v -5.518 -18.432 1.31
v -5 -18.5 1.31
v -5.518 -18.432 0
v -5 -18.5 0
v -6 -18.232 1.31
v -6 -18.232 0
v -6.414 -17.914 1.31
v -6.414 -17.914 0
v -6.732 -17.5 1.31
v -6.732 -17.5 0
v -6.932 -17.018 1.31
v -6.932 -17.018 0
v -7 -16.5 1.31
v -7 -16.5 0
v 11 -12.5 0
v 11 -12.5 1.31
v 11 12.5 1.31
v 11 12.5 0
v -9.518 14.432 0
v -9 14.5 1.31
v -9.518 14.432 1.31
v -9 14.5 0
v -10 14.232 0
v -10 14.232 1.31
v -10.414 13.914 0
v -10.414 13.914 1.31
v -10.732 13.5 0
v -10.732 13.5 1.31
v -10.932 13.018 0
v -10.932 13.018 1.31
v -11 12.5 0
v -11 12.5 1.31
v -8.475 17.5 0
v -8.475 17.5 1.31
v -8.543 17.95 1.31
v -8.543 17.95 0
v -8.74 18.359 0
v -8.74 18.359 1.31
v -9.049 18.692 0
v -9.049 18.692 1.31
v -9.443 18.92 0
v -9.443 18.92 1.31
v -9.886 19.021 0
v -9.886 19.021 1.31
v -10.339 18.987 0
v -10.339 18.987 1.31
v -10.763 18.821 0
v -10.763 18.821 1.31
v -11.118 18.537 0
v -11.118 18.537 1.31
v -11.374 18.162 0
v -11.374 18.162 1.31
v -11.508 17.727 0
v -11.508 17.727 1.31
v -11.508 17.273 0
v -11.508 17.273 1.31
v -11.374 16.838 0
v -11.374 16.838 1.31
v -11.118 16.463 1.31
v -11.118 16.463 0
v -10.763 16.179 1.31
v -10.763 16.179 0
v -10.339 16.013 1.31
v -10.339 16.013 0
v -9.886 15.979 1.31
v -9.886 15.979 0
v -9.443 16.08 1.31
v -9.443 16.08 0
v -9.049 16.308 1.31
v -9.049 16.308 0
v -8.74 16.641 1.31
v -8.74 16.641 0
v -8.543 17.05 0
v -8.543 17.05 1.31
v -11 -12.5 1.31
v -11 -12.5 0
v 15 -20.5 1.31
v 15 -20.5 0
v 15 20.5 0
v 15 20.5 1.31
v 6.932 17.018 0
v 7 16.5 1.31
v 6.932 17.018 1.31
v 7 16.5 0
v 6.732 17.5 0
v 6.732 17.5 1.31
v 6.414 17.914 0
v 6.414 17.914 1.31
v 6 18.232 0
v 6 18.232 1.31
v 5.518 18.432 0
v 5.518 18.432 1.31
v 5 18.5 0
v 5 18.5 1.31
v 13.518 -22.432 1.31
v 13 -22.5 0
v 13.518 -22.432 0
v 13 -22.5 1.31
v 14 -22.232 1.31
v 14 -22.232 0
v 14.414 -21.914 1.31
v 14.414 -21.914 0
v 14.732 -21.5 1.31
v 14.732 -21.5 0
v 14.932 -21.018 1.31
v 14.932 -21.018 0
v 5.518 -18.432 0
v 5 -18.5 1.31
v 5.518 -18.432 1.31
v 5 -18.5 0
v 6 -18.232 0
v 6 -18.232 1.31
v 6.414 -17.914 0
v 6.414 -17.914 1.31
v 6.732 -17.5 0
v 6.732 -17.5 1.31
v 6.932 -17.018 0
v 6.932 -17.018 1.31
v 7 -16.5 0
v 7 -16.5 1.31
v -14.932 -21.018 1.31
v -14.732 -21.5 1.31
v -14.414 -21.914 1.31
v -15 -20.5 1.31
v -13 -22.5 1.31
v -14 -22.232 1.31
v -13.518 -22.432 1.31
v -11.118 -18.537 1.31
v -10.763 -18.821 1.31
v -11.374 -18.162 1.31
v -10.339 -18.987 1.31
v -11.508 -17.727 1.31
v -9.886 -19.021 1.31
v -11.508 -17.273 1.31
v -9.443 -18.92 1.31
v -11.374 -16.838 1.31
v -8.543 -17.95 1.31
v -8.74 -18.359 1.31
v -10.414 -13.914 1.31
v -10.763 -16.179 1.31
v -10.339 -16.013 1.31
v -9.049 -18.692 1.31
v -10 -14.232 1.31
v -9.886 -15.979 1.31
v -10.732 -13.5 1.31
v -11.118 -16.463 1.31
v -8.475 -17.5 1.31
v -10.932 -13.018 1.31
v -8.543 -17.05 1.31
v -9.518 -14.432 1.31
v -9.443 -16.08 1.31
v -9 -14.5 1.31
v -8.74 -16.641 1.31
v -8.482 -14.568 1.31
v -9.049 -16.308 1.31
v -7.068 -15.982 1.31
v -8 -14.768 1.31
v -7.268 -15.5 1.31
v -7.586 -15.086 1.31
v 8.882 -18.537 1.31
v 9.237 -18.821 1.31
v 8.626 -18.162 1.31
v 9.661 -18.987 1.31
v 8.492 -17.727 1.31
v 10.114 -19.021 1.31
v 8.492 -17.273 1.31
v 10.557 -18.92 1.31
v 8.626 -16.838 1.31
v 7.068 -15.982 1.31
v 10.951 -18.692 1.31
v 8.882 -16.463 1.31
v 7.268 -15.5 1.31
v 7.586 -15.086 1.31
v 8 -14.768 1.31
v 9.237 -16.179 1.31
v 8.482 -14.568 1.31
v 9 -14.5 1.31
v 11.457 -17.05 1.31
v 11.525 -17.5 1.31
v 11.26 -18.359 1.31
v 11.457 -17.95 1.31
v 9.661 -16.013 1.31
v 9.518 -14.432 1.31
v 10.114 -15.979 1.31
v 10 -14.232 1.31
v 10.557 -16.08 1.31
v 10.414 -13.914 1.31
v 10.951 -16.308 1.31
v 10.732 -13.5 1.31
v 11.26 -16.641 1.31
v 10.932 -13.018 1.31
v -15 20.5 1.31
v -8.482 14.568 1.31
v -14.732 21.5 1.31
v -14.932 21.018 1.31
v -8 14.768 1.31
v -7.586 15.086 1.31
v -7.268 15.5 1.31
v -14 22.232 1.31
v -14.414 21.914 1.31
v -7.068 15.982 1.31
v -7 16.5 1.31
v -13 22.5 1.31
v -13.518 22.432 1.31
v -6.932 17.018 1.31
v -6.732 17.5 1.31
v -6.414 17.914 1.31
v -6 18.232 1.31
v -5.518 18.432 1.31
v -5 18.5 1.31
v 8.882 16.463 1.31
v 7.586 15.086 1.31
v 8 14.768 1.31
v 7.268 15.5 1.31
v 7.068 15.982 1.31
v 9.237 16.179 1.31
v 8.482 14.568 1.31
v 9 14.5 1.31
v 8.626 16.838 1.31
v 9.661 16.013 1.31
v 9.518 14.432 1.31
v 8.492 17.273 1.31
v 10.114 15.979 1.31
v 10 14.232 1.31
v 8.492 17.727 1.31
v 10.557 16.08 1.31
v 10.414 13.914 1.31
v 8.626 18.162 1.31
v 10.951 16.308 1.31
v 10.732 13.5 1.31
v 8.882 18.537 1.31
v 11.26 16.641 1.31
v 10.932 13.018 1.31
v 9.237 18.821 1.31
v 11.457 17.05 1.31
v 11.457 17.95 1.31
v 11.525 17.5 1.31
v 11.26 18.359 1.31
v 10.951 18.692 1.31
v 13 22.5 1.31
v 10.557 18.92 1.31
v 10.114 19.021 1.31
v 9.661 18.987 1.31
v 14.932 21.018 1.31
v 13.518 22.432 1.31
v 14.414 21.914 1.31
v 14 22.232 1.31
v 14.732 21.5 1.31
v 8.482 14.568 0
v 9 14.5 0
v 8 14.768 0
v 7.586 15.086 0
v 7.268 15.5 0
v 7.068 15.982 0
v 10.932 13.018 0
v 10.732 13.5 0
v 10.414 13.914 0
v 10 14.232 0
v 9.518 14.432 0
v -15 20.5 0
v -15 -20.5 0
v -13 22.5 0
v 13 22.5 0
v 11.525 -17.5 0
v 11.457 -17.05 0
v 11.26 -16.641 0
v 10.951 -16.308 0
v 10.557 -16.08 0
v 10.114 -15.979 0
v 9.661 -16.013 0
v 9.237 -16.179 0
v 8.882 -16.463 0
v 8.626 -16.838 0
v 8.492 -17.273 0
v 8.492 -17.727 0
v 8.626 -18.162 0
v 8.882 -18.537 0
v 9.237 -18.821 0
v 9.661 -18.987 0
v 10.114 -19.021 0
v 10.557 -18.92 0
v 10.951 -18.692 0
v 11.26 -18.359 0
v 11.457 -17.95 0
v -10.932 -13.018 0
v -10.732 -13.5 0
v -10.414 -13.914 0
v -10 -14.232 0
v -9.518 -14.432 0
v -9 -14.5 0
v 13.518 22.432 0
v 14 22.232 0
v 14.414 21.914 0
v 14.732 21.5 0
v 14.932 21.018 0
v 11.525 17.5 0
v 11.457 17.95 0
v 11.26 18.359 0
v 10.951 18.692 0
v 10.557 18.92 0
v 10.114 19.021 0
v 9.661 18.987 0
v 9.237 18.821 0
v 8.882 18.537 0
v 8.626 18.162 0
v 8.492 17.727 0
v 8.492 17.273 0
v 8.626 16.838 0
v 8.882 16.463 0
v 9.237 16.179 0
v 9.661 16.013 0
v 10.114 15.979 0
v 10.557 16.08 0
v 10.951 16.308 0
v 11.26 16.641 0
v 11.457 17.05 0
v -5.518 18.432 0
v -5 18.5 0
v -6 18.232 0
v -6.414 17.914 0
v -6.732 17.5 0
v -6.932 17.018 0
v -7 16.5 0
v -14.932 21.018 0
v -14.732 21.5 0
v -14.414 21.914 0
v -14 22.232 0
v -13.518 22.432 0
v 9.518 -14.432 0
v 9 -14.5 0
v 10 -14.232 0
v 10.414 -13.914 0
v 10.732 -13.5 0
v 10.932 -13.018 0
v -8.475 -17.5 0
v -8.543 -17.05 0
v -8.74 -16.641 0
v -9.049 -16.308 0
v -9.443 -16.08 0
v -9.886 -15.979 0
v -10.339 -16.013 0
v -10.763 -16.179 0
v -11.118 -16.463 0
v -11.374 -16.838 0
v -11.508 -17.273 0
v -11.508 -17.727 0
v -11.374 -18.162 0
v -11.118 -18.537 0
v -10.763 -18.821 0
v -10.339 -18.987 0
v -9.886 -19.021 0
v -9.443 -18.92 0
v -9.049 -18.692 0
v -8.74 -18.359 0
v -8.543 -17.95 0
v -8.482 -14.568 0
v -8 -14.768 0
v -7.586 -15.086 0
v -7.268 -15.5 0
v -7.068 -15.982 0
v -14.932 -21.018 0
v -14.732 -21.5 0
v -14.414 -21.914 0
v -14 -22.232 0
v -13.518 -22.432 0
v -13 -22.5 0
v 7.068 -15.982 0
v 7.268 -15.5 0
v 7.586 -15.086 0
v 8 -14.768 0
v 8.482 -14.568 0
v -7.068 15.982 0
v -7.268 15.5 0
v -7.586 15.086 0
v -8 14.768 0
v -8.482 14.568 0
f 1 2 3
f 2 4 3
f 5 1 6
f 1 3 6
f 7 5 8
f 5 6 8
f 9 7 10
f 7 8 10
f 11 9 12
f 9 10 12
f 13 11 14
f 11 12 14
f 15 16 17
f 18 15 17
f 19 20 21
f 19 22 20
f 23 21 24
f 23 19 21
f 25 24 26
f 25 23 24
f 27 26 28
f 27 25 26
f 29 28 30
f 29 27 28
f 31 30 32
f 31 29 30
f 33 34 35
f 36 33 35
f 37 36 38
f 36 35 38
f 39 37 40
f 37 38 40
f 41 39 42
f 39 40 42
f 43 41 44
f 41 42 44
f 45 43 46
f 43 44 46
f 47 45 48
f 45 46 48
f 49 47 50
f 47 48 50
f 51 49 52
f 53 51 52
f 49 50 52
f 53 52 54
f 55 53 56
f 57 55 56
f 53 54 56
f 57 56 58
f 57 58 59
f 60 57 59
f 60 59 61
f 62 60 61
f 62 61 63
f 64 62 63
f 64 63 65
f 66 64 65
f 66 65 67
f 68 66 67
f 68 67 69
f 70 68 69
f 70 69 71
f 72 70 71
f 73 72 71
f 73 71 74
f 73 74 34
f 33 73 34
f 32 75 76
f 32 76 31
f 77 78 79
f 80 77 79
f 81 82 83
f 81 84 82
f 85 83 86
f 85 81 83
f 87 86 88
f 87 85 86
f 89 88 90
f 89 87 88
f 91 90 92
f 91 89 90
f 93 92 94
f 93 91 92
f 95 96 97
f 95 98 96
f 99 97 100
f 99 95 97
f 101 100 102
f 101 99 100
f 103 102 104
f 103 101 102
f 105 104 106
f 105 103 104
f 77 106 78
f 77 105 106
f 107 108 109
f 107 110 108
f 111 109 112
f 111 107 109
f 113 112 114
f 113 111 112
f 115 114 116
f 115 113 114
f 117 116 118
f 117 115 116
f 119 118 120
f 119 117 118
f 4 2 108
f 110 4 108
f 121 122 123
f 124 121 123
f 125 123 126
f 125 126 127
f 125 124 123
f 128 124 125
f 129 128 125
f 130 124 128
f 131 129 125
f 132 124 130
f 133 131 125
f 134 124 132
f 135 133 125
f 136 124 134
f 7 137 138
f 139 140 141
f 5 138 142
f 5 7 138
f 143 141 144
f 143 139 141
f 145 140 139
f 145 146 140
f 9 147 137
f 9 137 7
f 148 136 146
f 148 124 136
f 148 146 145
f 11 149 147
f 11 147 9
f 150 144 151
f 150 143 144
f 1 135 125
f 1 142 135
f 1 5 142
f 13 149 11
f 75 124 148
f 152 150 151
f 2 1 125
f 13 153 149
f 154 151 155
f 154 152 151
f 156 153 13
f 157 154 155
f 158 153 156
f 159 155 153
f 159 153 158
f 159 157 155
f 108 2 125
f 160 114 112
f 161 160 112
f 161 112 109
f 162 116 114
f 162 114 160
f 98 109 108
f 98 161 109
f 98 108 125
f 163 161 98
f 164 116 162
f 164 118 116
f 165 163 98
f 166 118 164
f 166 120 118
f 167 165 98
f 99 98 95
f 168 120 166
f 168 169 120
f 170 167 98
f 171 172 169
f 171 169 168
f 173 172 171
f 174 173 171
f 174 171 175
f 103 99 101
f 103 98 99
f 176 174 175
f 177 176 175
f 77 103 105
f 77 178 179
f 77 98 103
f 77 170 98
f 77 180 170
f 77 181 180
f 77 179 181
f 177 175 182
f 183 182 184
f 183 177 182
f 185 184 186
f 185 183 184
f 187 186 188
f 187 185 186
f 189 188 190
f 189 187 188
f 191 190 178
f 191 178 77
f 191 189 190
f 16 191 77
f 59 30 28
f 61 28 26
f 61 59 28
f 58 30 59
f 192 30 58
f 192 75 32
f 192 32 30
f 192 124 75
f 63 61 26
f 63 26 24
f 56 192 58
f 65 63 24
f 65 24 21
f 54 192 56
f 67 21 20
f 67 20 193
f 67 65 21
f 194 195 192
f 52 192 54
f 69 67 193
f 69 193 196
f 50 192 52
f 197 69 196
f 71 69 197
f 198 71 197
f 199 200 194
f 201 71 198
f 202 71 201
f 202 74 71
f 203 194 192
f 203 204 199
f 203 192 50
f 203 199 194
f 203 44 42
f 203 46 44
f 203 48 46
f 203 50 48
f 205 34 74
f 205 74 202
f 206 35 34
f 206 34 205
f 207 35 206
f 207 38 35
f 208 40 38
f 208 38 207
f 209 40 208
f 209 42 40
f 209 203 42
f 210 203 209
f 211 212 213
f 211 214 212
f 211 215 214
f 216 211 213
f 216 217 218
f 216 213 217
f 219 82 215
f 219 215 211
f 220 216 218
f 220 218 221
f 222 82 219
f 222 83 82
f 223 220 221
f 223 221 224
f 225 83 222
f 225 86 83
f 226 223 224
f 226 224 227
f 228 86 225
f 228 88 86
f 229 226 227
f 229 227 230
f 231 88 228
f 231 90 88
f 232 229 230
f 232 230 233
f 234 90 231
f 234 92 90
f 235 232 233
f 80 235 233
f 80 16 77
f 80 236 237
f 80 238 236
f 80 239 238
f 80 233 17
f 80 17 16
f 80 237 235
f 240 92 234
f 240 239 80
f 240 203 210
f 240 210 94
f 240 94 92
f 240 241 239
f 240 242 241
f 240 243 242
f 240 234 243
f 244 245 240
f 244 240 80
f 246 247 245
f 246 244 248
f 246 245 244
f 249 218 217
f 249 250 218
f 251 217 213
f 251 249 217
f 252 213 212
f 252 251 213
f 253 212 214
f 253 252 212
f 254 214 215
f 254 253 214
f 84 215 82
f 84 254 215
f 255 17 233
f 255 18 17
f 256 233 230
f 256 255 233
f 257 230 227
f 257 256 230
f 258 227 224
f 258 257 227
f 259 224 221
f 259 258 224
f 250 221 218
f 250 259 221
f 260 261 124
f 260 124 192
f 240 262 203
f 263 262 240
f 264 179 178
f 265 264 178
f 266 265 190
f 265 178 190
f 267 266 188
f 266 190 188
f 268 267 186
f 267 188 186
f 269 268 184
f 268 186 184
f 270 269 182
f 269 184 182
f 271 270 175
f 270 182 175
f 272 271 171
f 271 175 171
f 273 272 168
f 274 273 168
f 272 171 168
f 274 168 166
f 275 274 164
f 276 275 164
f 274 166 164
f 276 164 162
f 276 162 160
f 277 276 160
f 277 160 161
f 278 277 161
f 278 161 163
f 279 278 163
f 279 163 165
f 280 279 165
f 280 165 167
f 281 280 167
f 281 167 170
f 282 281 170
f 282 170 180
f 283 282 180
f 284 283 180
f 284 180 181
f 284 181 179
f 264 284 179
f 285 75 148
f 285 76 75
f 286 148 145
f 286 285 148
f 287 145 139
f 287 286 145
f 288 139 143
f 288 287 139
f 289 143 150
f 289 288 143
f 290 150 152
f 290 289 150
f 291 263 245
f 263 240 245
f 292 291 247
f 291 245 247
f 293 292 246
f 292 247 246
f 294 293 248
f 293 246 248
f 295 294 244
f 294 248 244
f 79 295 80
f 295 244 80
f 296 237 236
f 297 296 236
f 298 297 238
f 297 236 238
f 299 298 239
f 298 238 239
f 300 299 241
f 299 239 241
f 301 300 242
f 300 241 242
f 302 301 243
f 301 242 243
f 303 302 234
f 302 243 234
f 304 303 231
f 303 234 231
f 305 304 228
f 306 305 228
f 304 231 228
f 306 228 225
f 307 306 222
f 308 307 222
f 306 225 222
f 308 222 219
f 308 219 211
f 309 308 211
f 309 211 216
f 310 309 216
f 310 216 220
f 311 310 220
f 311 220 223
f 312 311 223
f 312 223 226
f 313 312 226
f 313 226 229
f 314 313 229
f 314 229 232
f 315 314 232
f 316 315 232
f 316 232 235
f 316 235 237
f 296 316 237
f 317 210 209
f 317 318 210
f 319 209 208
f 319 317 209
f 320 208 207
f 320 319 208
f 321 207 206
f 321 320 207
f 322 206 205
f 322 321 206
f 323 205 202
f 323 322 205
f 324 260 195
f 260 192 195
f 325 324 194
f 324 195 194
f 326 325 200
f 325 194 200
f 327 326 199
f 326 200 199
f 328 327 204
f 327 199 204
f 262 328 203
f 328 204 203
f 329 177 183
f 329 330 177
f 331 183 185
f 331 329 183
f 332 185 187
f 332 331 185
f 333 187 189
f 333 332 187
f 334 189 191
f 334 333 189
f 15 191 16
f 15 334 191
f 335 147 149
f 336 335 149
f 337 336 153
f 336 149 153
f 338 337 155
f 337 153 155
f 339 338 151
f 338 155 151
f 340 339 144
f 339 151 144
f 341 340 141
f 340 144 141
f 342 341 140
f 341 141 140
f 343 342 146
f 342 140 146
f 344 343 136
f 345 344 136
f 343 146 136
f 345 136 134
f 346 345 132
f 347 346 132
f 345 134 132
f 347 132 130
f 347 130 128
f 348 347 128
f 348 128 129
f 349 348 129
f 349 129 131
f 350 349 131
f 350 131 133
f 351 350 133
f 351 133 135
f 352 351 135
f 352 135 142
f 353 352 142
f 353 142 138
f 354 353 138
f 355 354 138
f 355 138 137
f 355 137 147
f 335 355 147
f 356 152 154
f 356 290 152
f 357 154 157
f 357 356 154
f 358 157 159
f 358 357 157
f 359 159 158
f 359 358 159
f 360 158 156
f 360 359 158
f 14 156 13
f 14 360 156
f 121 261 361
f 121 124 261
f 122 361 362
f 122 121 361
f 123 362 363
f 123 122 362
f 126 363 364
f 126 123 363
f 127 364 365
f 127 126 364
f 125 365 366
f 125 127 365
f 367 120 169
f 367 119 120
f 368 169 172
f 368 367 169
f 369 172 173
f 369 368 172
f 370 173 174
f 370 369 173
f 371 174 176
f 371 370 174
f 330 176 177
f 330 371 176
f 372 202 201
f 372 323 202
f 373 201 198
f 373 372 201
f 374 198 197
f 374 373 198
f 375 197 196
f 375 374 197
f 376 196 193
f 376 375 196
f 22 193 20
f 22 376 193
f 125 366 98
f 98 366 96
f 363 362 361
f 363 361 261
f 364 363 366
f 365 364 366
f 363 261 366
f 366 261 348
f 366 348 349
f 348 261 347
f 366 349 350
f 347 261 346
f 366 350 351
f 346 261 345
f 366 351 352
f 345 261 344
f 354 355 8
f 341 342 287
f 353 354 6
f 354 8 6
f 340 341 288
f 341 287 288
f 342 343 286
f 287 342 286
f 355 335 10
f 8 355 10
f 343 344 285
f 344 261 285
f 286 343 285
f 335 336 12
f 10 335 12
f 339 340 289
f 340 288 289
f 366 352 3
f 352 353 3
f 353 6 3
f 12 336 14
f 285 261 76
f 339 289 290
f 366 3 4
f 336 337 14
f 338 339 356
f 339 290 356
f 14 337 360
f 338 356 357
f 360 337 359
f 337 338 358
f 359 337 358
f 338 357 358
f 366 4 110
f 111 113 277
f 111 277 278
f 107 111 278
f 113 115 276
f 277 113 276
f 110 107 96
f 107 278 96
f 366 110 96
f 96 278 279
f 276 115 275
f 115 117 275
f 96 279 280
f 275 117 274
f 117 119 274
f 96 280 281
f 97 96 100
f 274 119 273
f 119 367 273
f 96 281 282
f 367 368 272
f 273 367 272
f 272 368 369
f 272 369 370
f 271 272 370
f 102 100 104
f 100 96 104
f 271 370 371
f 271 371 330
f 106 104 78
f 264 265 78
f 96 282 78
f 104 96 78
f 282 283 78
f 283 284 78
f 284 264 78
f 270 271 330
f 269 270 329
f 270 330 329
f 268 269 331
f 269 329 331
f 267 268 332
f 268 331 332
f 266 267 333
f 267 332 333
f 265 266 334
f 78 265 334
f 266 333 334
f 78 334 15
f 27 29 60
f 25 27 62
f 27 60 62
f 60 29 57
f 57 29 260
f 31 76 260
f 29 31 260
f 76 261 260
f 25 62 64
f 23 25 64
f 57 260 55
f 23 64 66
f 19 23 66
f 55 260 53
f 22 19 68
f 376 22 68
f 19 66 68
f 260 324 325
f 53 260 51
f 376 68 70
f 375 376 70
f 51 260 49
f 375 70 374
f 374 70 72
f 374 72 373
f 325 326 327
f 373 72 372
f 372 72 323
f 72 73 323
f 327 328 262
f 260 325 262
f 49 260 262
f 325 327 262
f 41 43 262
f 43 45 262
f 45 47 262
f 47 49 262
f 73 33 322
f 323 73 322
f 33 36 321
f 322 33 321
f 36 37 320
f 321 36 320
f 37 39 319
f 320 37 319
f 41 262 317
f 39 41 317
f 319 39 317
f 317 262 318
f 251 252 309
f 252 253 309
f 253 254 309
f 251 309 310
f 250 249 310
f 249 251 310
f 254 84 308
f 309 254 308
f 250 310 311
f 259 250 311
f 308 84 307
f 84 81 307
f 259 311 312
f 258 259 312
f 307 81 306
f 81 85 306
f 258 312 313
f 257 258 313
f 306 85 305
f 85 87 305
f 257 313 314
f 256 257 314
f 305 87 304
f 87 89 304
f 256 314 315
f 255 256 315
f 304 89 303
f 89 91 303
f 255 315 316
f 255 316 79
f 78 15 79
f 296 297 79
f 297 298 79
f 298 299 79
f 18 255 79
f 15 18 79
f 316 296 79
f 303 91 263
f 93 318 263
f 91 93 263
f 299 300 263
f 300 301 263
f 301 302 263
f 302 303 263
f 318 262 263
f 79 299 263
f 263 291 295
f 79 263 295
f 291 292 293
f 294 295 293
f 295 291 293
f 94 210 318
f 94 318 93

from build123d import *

# Parameters (mm, degrees)
SKETCH_1_W          = 30
SKETCH_1_H          = 45
EXTRUDE_1_DEPTH     = 1.31
SKETCH_2_R          = 1.525
CUT_EXTRUDE_1_DEPTH = 10
SKETCH_3_W          = 14
SKETCH_3_H          = 37
CUT_EXTRUDE_2_DEPTH = 10
SKETCH_4_W          = 22
SKETCH_4_H          = 29
CUT_EXTRUDE_3_DEPTH = 10
FILLET_1_R          = 2
FILLET_2_R          = 2


with BuildPart() as part:
    # 草图1 → 凸台-拉伸1 (new body)
    with BuildSketch(Plane.XY):
        Rectangle(SKETCH_1_W, SKETCH_1_H)
    extrude(amount=EXTRUDE_1_DEPTH)

    # 草图2 → 切除-拉伸1 (cut)
    with BuildSketch(Plane.XY.offset(1.31)):
        with Locations((-10, 17.5)):
            Circle(SKETCH_2_R)
        with Locations((10, 17.5)):
            Circle(SKETCH_2_R)
        with Locations((-10, -17.5)):
            Circle(SKETCH_2_R)
        with Locations((10, -17.5)):
            Circle(SKETCH_2_R)
    extrude(amount=-CUT_EXTRUDE_1_DEPTH, mode=Mode.SUBTRACT)

    # 草图3 → 切除-拉伸2 (cut)
    with BuildSketch(Plane.XY.offset(1.31)):
        Rectangle(SKETCH_3_W, SKETCH_3_H)
    extrude(amount=-CUT_EXTRUDE_2_DEPTH, mode=Mode.SUBTRACT)

    # 草图4 → 切除-拉伸3 (cut)
    with BuildSketch(Plane.XY.offset(1.31)):
        Rectangle(SKETCH_4_W, SKETCH_4_H)
    extrude(amount=-CUT_EXTRUDE_3_DEPTH, mode=Mode.SUBTRACT)

    # 圆角1
    fillet_1_edges = [part.edges().sort_by_distance(p)[0] for p in [
        (-7, -18.5, 0.655),
        (11, -14.5, 0.655),
        (11, 14.5, 0.655),
        (7, 14.5, 0.655),
        (7, 18.5, 0.655),
        (-7, 18.5, 0.655),
        (-7, 14.5, 0.655),
        (-11, 14.5, 0.655),
        (-11, -14.5, 0.655),
        (-7, -14.5, 0.655),
        (7, -14.5, 0.655),
        (7, -18.5, 0.655),
    ]]
    fillet(fillet_1_edges, radius=FILLET_1_R - 0.0001)  # a hair under: the kernel refuses the full size

    # 圆角2
    fillet_2_edges = [part.edges().sort_by_distance(p)[0] for p in [
        (15, -22.5, 0.655),
        (-15, -22.5, 0.655),
        (-15, 22.5, 0.655),
        (15, 22.5, 0.655),
    ]]
    fillet(fillet_2_edges, radius=FILLET_2_R)


solid = part.part
